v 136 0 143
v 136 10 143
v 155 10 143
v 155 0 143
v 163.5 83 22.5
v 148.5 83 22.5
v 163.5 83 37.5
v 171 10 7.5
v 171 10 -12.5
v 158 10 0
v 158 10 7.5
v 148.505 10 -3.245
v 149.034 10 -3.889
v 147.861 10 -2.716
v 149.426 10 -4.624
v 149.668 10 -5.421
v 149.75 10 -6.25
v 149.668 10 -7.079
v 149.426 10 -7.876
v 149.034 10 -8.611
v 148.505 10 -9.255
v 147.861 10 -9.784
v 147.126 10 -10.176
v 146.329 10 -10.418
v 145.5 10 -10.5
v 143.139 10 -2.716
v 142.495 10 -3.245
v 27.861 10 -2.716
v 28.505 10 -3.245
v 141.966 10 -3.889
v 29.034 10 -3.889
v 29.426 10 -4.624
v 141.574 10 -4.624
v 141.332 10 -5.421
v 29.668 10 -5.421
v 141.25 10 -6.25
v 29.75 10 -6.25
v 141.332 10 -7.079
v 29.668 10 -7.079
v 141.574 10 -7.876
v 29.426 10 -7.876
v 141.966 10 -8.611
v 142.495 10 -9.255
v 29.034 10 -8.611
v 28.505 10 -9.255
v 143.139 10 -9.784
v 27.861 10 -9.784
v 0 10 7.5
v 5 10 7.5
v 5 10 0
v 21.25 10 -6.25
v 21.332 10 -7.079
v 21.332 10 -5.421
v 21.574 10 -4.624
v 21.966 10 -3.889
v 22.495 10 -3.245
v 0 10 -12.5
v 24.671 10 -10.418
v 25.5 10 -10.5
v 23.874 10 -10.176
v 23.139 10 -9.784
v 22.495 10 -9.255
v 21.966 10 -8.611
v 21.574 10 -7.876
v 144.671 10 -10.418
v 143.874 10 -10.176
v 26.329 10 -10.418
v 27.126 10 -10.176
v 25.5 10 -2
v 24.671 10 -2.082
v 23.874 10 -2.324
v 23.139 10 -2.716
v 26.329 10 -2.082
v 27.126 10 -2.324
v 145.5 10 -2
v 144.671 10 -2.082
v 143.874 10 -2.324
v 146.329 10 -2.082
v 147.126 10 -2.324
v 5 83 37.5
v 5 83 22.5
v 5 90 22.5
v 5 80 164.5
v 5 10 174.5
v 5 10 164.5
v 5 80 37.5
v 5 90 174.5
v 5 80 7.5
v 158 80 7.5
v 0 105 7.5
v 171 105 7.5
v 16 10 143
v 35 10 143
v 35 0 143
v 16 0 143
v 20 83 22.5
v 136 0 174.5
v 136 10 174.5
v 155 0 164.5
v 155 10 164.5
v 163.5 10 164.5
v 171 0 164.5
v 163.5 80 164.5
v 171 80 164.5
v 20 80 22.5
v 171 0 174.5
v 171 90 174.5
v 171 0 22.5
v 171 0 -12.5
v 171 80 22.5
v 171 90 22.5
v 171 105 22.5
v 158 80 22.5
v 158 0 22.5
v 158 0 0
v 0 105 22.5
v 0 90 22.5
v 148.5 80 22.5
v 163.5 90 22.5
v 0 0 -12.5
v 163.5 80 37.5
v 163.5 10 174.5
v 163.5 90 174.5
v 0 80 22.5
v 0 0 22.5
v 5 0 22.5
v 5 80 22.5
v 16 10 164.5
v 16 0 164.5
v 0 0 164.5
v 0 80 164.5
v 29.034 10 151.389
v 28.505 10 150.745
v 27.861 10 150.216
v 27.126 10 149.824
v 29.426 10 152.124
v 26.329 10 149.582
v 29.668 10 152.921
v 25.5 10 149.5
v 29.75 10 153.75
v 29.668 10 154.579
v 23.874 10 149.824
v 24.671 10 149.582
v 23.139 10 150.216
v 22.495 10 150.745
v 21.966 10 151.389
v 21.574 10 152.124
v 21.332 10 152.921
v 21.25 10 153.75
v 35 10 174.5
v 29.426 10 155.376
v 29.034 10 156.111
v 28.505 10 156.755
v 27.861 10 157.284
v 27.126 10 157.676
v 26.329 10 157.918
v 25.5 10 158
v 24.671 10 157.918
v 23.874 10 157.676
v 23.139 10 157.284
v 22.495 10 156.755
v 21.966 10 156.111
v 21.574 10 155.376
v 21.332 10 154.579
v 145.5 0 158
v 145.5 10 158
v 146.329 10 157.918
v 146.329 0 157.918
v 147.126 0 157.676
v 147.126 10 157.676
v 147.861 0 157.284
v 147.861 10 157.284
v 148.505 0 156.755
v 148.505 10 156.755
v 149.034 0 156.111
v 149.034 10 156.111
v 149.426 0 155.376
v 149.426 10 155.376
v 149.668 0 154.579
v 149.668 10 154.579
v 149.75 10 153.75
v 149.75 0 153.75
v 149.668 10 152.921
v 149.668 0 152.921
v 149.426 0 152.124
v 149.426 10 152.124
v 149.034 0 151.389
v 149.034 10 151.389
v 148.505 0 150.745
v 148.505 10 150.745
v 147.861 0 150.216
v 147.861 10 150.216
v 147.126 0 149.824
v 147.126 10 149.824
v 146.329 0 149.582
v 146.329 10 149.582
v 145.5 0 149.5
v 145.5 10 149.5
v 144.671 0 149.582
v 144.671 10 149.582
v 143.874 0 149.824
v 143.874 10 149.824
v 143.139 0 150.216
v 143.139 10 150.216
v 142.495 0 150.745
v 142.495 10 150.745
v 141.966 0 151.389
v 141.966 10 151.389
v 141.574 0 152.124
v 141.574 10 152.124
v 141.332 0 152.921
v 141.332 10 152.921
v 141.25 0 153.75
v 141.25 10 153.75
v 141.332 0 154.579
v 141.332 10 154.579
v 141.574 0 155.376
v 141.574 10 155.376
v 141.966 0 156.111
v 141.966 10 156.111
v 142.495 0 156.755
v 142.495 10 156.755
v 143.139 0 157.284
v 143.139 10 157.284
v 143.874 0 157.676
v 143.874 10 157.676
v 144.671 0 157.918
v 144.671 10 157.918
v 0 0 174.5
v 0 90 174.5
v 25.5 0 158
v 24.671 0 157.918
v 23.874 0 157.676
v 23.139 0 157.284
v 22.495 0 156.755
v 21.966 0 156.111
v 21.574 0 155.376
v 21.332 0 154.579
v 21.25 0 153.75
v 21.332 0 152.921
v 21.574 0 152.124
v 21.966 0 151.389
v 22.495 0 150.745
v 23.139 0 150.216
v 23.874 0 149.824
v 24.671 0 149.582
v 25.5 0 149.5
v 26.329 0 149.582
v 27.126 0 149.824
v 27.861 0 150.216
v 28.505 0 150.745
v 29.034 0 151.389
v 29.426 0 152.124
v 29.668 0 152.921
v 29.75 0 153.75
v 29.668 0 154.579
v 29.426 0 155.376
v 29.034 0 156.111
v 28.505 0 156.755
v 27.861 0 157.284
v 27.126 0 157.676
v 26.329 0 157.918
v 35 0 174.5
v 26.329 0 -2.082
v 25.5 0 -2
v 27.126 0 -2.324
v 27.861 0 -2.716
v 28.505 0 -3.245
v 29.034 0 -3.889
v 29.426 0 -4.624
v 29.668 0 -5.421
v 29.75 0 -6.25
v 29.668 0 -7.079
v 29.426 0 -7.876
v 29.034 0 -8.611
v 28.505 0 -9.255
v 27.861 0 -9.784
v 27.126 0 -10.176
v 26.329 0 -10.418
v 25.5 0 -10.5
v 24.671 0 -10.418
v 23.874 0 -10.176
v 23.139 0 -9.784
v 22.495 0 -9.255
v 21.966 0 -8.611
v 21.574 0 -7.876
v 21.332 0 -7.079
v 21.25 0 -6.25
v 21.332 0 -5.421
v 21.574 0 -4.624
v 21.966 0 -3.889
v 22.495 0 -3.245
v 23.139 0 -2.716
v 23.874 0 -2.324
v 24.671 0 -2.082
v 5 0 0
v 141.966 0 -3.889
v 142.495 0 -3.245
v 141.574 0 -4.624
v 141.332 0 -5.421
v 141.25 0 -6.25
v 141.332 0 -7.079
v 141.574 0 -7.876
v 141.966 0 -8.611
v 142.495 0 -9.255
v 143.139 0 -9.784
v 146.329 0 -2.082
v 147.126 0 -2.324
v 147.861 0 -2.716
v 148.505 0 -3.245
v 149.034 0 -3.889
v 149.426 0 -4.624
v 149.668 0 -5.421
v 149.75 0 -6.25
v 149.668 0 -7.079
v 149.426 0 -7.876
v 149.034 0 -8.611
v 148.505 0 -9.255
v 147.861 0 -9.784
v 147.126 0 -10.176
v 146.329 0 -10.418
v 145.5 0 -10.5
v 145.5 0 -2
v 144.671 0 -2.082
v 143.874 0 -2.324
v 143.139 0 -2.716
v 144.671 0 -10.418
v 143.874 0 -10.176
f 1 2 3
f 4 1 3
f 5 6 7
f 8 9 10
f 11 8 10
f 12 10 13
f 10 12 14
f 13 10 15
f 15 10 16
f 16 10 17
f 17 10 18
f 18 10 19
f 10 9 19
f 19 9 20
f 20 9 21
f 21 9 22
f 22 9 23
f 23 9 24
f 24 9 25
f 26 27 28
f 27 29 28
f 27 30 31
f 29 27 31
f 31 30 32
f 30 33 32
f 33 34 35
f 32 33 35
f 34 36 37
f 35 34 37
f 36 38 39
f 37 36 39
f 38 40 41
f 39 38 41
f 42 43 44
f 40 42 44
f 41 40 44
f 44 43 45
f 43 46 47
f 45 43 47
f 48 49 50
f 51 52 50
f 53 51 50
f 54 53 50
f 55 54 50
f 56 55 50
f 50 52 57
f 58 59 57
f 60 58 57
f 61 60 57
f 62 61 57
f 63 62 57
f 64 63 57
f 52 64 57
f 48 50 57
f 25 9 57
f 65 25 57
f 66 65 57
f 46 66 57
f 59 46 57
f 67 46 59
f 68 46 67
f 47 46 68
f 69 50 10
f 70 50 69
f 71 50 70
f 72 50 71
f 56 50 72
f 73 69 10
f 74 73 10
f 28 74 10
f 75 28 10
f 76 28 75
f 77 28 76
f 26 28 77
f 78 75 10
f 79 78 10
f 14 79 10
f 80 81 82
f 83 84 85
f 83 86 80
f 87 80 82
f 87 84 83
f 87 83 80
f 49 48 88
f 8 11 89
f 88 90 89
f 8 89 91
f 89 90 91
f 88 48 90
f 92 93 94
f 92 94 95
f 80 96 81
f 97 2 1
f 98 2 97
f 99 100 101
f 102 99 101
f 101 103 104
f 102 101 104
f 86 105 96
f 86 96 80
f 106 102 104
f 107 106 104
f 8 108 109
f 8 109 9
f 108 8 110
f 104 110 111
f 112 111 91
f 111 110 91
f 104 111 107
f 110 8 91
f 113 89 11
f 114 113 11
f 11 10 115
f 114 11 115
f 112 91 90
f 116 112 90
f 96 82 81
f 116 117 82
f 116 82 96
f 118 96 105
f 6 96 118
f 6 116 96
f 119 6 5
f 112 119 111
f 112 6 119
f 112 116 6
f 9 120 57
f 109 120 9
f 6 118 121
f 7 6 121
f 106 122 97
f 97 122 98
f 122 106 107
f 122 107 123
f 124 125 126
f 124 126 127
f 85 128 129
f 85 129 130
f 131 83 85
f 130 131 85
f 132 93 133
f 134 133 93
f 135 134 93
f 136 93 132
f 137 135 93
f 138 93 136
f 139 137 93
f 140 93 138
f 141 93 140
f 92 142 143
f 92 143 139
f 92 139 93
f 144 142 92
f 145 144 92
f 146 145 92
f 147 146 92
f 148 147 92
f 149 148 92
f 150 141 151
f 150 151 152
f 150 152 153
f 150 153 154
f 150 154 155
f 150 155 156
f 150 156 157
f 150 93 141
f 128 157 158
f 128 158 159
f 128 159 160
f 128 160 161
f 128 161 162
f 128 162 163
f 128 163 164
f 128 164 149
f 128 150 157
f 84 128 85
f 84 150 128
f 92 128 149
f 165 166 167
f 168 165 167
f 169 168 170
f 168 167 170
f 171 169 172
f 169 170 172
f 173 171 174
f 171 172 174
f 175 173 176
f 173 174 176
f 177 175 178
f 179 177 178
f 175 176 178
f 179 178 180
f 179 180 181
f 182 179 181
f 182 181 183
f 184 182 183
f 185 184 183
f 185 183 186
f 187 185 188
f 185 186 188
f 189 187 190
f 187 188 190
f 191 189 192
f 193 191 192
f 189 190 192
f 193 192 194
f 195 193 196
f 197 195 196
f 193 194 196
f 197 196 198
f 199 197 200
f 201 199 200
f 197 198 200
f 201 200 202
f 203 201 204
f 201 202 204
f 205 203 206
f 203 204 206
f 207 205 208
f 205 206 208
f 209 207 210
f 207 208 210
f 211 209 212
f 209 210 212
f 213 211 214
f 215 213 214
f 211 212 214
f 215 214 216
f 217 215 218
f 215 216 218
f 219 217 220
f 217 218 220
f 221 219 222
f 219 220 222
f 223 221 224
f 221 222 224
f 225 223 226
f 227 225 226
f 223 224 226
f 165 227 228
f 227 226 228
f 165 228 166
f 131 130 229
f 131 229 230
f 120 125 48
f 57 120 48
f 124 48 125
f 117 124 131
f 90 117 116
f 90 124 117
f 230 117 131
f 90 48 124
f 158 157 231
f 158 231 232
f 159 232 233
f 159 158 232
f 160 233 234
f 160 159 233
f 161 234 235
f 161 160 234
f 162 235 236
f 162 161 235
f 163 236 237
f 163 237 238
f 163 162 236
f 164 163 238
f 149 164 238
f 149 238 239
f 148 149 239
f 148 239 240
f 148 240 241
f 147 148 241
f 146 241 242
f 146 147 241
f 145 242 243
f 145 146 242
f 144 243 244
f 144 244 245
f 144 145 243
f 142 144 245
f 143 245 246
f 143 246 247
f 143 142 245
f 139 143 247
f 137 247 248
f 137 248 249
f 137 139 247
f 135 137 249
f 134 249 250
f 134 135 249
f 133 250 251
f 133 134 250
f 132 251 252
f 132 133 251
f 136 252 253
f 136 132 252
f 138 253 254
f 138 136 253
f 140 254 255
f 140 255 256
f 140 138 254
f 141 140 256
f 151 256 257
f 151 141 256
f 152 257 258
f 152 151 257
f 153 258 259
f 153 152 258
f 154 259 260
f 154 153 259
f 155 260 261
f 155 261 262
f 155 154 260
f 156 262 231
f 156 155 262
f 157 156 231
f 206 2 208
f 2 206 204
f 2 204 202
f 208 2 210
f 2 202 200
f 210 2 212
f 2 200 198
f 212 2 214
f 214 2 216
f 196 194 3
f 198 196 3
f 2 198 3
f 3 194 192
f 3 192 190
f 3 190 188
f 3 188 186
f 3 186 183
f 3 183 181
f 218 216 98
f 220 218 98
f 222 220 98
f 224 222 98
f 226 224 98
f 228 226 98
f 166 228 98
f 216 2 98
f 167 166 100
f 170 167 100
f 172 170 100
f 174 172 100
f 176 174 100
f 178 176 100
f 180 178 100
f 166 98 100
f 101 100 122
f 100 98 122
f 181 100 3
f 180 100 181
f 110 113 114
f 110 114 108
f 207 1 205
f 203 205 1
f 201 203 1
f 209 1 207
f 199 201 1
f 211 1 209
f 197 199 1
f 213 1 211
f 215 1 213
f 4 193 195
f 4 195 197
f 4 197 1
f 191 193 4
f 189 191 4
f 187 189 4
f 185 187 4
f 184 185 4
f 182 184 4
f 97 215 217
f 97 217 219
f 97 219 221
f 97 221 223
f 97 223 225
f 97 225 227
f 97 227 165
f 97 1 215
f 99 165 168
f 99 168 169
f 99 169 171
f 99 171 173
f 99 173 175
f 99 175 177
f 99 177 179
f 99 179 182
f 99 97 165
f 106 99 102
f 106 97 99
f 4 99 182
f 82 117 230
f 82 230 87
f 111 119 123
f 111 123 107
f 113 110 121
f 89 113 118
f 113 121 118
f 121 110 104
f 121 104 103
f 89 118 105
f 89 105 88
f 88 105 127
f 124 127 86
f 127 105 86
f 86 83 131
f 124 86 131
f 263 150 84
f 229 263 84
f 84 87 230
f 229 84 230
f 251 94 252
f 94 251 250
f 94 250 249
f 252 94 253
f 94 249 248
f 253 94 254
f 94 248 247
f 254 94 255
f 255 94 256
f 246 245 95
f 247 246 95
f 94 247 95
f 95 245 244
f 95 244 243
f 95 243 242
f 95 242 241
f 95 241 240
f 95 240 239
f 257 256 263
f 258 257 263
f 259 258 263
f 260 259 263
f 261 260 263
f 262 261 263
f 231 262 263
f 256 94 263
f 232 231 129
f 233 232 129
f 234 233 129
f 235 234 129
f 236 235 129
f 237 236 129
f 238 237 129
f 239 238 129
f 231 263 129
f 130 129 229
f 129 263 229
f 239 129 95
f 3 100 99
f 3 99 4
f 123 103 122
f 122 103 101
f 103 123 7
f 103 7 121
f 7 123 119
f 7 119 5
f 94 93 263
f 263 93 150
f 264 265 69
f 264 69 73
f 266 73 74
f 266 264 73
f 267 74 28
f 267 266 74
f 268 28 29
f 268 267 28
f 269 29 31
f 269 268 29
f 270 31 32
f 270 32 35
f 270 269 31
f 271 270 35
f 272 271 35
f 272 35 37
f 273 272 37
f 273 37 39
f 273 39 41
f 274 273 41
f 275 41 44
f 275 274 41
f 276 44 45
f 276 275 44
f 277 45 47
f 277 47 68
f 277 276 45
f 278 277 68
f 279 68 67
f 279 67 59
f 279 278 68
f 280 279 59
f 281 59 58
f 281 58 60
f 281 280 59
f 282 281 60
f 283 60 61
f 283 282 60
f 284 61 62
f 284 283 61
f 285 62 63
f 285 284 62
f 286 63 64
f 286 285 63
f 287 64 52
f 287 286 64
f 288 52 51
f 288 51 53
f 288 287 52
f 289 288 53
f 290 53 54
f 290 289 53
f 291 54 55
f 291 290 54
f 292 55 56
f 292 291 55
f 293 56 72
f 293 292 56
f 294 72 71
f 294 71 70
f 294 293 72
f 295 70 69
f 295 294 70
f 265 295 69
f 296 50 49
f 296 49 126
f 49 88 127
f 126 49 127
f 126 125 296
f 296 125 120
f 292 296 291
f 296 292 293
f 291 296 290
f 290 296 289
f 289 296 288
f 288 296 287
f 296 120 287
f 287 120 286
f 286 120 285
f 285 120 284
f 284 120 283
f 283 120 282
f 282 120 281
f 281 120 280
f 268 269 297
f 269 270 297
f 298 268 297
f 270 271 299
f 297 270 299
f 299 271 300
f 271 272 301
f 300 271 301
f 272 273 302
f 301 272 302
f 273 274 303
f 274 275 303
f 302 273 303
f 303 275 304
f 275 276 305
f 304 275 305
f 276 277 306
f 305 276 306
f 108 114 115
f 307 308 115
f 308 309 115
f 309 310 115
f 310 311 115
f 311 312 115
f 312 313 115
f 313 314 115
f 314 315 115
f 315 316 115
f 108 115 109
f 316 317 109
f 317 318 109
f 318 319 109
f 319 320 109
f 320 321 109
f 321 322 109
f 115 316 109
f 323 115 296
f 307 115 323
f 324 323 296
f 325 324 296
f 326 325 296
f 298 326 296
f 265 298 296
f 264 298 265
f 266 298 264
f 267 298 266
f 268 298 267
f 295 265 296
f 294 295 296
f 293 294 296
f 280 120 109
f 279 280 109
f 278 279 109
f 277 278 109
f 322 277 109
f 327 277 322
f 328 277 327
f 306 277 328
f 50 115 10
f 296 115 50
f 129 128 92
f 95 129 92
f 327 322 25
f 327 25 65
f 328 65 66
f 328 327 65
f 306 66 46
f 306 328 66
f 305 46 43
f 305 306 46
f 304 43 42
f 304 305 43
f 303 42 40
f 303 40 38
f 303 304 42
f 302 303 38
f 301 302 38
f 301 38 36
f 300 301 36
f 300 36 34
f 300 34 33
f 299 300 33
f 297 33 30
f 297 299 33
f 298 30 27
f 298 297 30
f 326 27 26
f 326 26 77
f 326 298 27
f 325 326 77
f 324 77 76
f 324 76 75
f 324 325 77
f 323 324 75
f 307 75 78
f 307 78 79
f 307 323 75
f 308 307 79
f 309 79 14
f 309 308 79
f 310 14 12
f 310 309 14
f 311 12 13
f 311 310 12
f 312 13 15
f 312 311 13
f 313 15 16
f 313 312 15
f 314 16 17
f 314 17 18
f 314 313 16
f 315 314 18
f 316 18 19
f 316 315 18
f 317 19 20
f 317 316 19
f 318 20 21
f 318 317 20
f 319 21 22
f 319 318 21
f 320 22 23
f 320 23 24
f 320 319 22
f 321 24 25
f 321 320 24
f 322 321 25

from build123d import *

# Parameters (mm, degrees)
SKETCH1_R                                = 4.25
BOSS_EXTRUDE1_DEPTH                      = 10
BOSS_EXTRUDE2_START                      = -5
BOSS_EXTRUDE2_DEPTH                      = 15
SKETCH3_W                                = 342
SKETCH3_H                                = 10
BOSS_EXTRUDE3_DEPTH                      = 304
CUT_EXTRUDE1_REACH                       = 385.234
BOSS_EXTRUDE4_DEPTH                      = 3
MIRROR5_AT_THE_SECOND_PLANE_COPY_1_DEPTH = 3
BOSS_EXTRUDE5_DEPTH                      = 5
BOSS_EXTRUDE5_DEPTH_BACK                 = 5
BOSS_EXTRUDE6_DEPTH                      = 10
SKETCH10_W                               = 19
SKETCH10_H                               = 21.5
SKETCH10_R                               = 4.25
BOSS_EXTRUDE7_DEPTH                      = 10
CUT_EXTRUDE2_REACH                       = 276.29
SKETCH11_W                               = 2.5
SKETCH11_H                               = 70
MIRROR8_COPY_1_DEPTH                     = 10
MIRROR8_COPY_2_DEPTH                     = 10
MIRROR8_COPY_3_SKETCH_W                  = 19
MIRROR8_COPY_3_SKETCH_H                  = 21.5
MIRROR8_COPY_3_SKETCH_R                  = 4.25
MIRROR8_COPY_3_DEPTH                     = 10
CUT_EXTRUDE5_REACH                       = 415.459
SKETCH14_W                               = 574.948758302
SKETCH14_H                               = 178.61459587
CUT_EXTRUDE6_REACH                       = 276.29
SKETCH15_W                               = 297.993149394
SKETCH15_H                               = 172.333387601


with BuildPart() as part:
    # Sketch1 → Boss-Extrude1 (new body)
    with BuildSketch(Plane(origin=(0, 0, 0), x_dir=(1, 0, 0), z_dir=(0, 1, 0))):
        Polygon((-171, 12.5), (171, 12.5), (171, 0), (171, -12.5), (158, -12.5), (158, 0), (-158, 0), (-158, -12.5), (-171, -12.5), align=None)
        with Locations(Location((-145.5, 6.25, 0), (0, 0, 270))):
            Circle(SKETCH1_R, mode=Mode.SUBTRACT)
        with Locations(Location((145.5, 6.25, 0), (0, 0, 90))):
            Circle(SKETCH1_R, mode=Mode.SUBTRACT)
        with Locations(Location((-25.5, 6.25, 0), (0, 0, 270))):
            Circle(SKETCH1_R, mode=Mode.SUBTRACT)
        with Locations(Location((25.5, 6.25, 0), (0, 0, 270))):
            Circle(SKETCH1_R, mode=Mode.SUBTRACT)
    boss_extrude1 = extrude(amount=BOSS_EXTRUDE1_DEPTH)

    # Sketch2 → Boss-Extrude2 (add)
    with BuildSketch(Plane.XY.offset(12.5).offset(BOSS_EXTRUDE2_START)):
        Polygon((-171, 105), (-171, 0), (-158, 0), (-158, 80), (158, 80), (158, 0), (171, 0), (171, 105), align=None)
    boss_extrude2 = extrude(amount=BOSS_EXTRUDE2_DEPTH)

    # Sketch3 → Boss-Extrude3 (add)
    with BuildSketch(Plane.XY.offset(22.5)):
        with Locations((0, 85)):
            Rectangle(SKETCH3_W, SKETCH3_H)
    extrude(amount=BOSS_EXTRUDE3_DEPTH)

    # Sketch4 → Cut-Extrude1 (cut, up to next)
    with BuildSketch(Plane(origin=(0, 105, 0), x_dir=(1, 0, 0), z_dir=(0, 1, 0)), mode=Mode.PRIVATE) as cut_extrude1_sk1:
        Polygon((-163.5, -22.5), (-5, -22.5), (-5, -326.5), (-163.5, -326.5), (-163.5, -39.75), (-163.5, -34.75), align=None)
    cut_extrude1_tool1 = extrude(cut_extrude1_sk1.sketch, amount=-CUT_EXTRUDE1_REACH, mode=Mode.PRIVATE) & part.part
    # Sketch4 → Cut-Extrude1 (cut, up to next)
    with BuildSketch(Plane(origin=(0, 105, 0), x_dir=(1, 0, 0), z_dir=(0, 1, 0)), mode=Mode.PRIVATE) as cut_extrude1_sk2:
        Polygon((163.5, -22.5), (163.5, -51.4723011), (163.5, -326.5), (5, -326.5), (5, -39.75), (5, -22.5), align=None)
    cut_extrude1_tool2 = extrude(cut_extrude1_sk2.sketch, amount=-CUT_EXTRUDE1_REACH, mode=Mode.PRIVATE) & part.part
    add(cut_extrude1_tool1.solids().sort_by_distance((-84.25, 105, 174.5))[0], mode=Mode.SUBTRACT)
    add(cut_extrude1_tool2.solids().sort_by_distance((84.25, 105, 174.5))[0], mode=Mode.SUBTRACT)

    # Mirror3: Boss-Extrude2 across plane
    add(boss_extrude2.mirror(Plane(origin=(0, 0, 174.5), x_dir=(1, 0, 0), z_dir=(0, 0, -1))))

    # Mirror4: Boss-Extrude1 across plane
    add(boss_extrude1.mirror(Plane(origin=(0, 0, 174.5), x_dir=(1, 0, 0), z_dir=(0, 0, -1))))

    # Sketch7 → Boss-Extrude4 (add)
    with BuildSketch(Plane(origin=(0, 80, 0), x_dir=(-1, 0, 0), z_dir=(0, -1, 0))):
        Polygon((-163.5, -22.5), (-148.5, -22.5), (-163.5, -37.5), align=None)
        Polygon((-5, -22.5), (-20, -22.5), (-5, -37.5), align=None)
    boss_extrude4 = extrude(amount=-BOSS_EXTRUDE4_DEPTH)

    # Mirror5: Boss-Extrude4 across plane
    add(boss_extrude4.mirror(Plane(origin=(0, 0, 174.5), x_dir=(1, 0, 0), z_dir=(0, 0, -1))))

    # Mirror5 at the second plane: Boss-Extrude4 across plane
    add(boss_extrude4.mirror(Plane(origin=(0, 0, 0), x_dir=(0, 0, 1), z_dir=(1, 0, 0))))

    # Mirror5 at the second plane copy 1 sketc → Mirror5 at the second plane copy 1 (add)
    with BuildSketch(Plane(origin=(0, 80, 349), x_dir=(1, 0, 0), z_dir=(0, -1, 0))):
        Polygon((-163.5, -22.5), (-148.5, -22.5), (-163.5, -37.5), align=None)
        Polygon((-5, -22.5), (-20, -22.5), (-5, -37.5), align=None)
    extrude(amount=-MIRROR5_AT_THE_SECOND_PLANE_COPY_1_DEPTH)

    # Sketch8 → Boss-Extrude5 (add, two sides: drawn at the far end of the back side and taken through both)
    with BuildSketch(Plane(origin=(0, 0, 0), x_dir=(0, 0, -1), z_dir=(1, 0, 0)).offset(-BOSS_EXTRUDE5_DEPTH_BACK)):
        Polygon((-326.5, 80), (-341.5, 80), (-341.5, 10), (-349, 10), (-349, 0), (-326.5, 0), align=None)
        Polygon((-22.5, 80), (-7.5, 80), (-7.5, 10), (0, 10), (0, 0), (-22.5, 0), align=None)
    extrude(amount=BOSS_EXTRUDE5_DEPTH + BOSS_EXTRUDE5_DEPTH_BACK)

    # Sketch9 → Boss-Extrude6 (add)
    with BuildSketch(Plane(origin=(0, 0, 174.5), x_dir=(-1, 0, 0), z_dir=(0, 0, -1))):
        Polygon((-163.5, 10), (-136, 10), (-136, 0), (-171, 0), (-171, 80), (-163.5, 80), align=None)
    boss_extrude6 = extrude(amount=BOSS_EXTRUDE6_DEPTH)

    # Sketch10 → Boss-Extrude7 (add)
    with BuildSketch(Plane(origin=(0, 10, 0), x_dir=(1, 0, 0), z_dir=(0, 1, 0))):
        with Locations((145.5, -153.75)):
            Rectangle(SKETCH10_W, SKETCH10_H)
        with Locations(Location((145.5, -153.75, 0), (0, 0, 270))):
            Circle(SKETCH10_R, mode=Mode.SUBTRACT)
    boss_extrude7 = extrude(amount=-BOSS_EXTRUDE7_DEPTH)

    # Mirror6: Boss-Extrude6 across plane
    add(boss_extrude6.mirror(Plane(origin=(85.5, 0, 0), x_dir=(0, 0, 1), z_dir=(1, 0, 0))))

    # Mirror7: Boss-Extrude6, Boss-Extrude7 across plane
    add(boss_extrude6.mirror(Plane(origin=(85.5, 0, 0), x_dir=(0, 0, 1), z_dir=(1, 0, 0))))
    add(boss_extrude7.mirror(Plane(origin=(85.5, 0, 0), x_dir=(0, 0, 1), z_dir=(1, 0, 0))))

    # Sketch11 → Cut-Extrude2 (cut, up to next)
    with BuildSketch(Plane.XY.offset(174.5), mode=Mode.PRIVATE) as cut_extrude2_sk1:
        with Locations((6.25, 45)):
            Rectangle(SKETCH11_W, SKETCH11_H)
    cut_extrude2_tool1 = extrude(cut_extrude2_sk1.sketch, amount=-CUT_EXTRUDE2_REACH, mode=Mode.PRIVATE) & part.part
    cut_extrude2 = cut_extrude2_tool1.solids().sort_by_distance((6.25, 45, 174.5))[0]
    add(cut_extrude2, mode=Mode.SUBTRACT)

    # Mirror8: Boss-Extrude6, Boss-Extrude7 across plane
    add(boss_extrude6.mirror(Plane(origin=(0, 0, 174.5), x_dir=(1, 0, 0), z_dir=(0, 0, -1))))
    add(boss_extrude7.mirror(Plane(origin=(0, 0, 174.5), x_dir=(1, 0, 0), z_dir=(0, 0, -1))))

    # Mirror8 copy 1 sketch → Mirror8 copy 1 (add)
    with BuildSketch(Plane(origin=(171, 0, 174.5), x_dir=(1, 0, 0), z_dir=(0, 0, 1))):
        Polygon((-163.5, 10), (-136, 10), (-136, 0), (-171, 0), (-171, 80), (-163.5, 80), align=None)
    extrude(amount=MIRROR8_COPY_1_DEPTH)

    # Mirror8 copy 2 sketch → Mirror8 copy 2 (add)
    with BuildSketch(Plane(origin=(171, 0, 174.5), x_dir=(1, 0, 0), z_dir=(0, 0, 1))):
        Polygon((-163.5, 10), (-136, 10), (-136, 0), (-171, 0), (-171, 80), (-163.5, 80), align=None)
    extrude(amount=MIRROR8_COPY_2_DEPTH)

    # Mirror8 copy 3 sketch → Mirror8 copy 3 (add)
    with BuildSketch(Plane(origin=(171, 10, 349), x_dir=(-1, 0, 0), z_dir=(0, 1, 0))):
        with Locations((145.5, -153.75)):
            Rectangle(MIRROR8_COPY_3_SKETCH_W, MIRROR8_COPY_3_SKETCH_H)
        with Locations(Location((145.5, -153.75, 0), (0, 0, 270))):
            Circle(MIRROR8_COPY_3_SKETCH_R, mode=Mode.SUBTRACT)
    extrude(amount=-MIRROR8_COPY_3_DEPTH)

    # Mirror9: Cut-Extrude2 across plane
    add(cut_extrude2.mirror(Plane(origin=(0, 0, 174.5), x_dir=(1, 0, 0), z_dir=(0, 0, -1))), mode=Mode.SUBTRACT)

    # Sketch14 → Cut-Extrude5 (cut, up to next)
    with BuildSketch(Plane(origin=(0, 0, 0), x_dir=(0, 0, -1), z_dir=(1, 0, 0)), mode=Mode.PRIVATE) as cut_extrude5_sk1:
        with Locations((-145.651613791, 39.902643452)):
            Rectangle(SKETCH14_W, SKETCH14_H)
    cut_extrude5_tool1 = extrude(cut_extrude5_sk1.sketch, amount=-CUT_EXTRUDE5_REACH, mode=Mode.PRIVATE) & part.part
    add(cut_extrude5_tool1.solids().sort_by_distance((0, 39.902643, 145.651614))[0], mode=Mode.SUBTRACT)

    # Sketch15 → Cut-Extrude6 (cut, up to next)
    with BuildSketch(Plane(origin=(0, 0, 174.5), x_dir=(-1, 0, 0), z_dir=(0, 0, -1)), mode=Mode.PRIVATE) as cut_extrude6_sk1:
        with Locations((-69.086440229, 41.027003033)):
            Rectangle(SKETCH15_W, SKETCH15_H)
    cut_extrude6_tool1 = extrude(cut_extrude6_sk1.sketch, amount=-CUT_EXTRUDE6_REACH, mode=Mode.PRIVATE) & part.part
    add(cut_extrude6_tool1.solids().sort_by_distance((69.08644, 41.027003, 174.5))[0], mode=Mode.SUBTRACT)


solid = part.part
